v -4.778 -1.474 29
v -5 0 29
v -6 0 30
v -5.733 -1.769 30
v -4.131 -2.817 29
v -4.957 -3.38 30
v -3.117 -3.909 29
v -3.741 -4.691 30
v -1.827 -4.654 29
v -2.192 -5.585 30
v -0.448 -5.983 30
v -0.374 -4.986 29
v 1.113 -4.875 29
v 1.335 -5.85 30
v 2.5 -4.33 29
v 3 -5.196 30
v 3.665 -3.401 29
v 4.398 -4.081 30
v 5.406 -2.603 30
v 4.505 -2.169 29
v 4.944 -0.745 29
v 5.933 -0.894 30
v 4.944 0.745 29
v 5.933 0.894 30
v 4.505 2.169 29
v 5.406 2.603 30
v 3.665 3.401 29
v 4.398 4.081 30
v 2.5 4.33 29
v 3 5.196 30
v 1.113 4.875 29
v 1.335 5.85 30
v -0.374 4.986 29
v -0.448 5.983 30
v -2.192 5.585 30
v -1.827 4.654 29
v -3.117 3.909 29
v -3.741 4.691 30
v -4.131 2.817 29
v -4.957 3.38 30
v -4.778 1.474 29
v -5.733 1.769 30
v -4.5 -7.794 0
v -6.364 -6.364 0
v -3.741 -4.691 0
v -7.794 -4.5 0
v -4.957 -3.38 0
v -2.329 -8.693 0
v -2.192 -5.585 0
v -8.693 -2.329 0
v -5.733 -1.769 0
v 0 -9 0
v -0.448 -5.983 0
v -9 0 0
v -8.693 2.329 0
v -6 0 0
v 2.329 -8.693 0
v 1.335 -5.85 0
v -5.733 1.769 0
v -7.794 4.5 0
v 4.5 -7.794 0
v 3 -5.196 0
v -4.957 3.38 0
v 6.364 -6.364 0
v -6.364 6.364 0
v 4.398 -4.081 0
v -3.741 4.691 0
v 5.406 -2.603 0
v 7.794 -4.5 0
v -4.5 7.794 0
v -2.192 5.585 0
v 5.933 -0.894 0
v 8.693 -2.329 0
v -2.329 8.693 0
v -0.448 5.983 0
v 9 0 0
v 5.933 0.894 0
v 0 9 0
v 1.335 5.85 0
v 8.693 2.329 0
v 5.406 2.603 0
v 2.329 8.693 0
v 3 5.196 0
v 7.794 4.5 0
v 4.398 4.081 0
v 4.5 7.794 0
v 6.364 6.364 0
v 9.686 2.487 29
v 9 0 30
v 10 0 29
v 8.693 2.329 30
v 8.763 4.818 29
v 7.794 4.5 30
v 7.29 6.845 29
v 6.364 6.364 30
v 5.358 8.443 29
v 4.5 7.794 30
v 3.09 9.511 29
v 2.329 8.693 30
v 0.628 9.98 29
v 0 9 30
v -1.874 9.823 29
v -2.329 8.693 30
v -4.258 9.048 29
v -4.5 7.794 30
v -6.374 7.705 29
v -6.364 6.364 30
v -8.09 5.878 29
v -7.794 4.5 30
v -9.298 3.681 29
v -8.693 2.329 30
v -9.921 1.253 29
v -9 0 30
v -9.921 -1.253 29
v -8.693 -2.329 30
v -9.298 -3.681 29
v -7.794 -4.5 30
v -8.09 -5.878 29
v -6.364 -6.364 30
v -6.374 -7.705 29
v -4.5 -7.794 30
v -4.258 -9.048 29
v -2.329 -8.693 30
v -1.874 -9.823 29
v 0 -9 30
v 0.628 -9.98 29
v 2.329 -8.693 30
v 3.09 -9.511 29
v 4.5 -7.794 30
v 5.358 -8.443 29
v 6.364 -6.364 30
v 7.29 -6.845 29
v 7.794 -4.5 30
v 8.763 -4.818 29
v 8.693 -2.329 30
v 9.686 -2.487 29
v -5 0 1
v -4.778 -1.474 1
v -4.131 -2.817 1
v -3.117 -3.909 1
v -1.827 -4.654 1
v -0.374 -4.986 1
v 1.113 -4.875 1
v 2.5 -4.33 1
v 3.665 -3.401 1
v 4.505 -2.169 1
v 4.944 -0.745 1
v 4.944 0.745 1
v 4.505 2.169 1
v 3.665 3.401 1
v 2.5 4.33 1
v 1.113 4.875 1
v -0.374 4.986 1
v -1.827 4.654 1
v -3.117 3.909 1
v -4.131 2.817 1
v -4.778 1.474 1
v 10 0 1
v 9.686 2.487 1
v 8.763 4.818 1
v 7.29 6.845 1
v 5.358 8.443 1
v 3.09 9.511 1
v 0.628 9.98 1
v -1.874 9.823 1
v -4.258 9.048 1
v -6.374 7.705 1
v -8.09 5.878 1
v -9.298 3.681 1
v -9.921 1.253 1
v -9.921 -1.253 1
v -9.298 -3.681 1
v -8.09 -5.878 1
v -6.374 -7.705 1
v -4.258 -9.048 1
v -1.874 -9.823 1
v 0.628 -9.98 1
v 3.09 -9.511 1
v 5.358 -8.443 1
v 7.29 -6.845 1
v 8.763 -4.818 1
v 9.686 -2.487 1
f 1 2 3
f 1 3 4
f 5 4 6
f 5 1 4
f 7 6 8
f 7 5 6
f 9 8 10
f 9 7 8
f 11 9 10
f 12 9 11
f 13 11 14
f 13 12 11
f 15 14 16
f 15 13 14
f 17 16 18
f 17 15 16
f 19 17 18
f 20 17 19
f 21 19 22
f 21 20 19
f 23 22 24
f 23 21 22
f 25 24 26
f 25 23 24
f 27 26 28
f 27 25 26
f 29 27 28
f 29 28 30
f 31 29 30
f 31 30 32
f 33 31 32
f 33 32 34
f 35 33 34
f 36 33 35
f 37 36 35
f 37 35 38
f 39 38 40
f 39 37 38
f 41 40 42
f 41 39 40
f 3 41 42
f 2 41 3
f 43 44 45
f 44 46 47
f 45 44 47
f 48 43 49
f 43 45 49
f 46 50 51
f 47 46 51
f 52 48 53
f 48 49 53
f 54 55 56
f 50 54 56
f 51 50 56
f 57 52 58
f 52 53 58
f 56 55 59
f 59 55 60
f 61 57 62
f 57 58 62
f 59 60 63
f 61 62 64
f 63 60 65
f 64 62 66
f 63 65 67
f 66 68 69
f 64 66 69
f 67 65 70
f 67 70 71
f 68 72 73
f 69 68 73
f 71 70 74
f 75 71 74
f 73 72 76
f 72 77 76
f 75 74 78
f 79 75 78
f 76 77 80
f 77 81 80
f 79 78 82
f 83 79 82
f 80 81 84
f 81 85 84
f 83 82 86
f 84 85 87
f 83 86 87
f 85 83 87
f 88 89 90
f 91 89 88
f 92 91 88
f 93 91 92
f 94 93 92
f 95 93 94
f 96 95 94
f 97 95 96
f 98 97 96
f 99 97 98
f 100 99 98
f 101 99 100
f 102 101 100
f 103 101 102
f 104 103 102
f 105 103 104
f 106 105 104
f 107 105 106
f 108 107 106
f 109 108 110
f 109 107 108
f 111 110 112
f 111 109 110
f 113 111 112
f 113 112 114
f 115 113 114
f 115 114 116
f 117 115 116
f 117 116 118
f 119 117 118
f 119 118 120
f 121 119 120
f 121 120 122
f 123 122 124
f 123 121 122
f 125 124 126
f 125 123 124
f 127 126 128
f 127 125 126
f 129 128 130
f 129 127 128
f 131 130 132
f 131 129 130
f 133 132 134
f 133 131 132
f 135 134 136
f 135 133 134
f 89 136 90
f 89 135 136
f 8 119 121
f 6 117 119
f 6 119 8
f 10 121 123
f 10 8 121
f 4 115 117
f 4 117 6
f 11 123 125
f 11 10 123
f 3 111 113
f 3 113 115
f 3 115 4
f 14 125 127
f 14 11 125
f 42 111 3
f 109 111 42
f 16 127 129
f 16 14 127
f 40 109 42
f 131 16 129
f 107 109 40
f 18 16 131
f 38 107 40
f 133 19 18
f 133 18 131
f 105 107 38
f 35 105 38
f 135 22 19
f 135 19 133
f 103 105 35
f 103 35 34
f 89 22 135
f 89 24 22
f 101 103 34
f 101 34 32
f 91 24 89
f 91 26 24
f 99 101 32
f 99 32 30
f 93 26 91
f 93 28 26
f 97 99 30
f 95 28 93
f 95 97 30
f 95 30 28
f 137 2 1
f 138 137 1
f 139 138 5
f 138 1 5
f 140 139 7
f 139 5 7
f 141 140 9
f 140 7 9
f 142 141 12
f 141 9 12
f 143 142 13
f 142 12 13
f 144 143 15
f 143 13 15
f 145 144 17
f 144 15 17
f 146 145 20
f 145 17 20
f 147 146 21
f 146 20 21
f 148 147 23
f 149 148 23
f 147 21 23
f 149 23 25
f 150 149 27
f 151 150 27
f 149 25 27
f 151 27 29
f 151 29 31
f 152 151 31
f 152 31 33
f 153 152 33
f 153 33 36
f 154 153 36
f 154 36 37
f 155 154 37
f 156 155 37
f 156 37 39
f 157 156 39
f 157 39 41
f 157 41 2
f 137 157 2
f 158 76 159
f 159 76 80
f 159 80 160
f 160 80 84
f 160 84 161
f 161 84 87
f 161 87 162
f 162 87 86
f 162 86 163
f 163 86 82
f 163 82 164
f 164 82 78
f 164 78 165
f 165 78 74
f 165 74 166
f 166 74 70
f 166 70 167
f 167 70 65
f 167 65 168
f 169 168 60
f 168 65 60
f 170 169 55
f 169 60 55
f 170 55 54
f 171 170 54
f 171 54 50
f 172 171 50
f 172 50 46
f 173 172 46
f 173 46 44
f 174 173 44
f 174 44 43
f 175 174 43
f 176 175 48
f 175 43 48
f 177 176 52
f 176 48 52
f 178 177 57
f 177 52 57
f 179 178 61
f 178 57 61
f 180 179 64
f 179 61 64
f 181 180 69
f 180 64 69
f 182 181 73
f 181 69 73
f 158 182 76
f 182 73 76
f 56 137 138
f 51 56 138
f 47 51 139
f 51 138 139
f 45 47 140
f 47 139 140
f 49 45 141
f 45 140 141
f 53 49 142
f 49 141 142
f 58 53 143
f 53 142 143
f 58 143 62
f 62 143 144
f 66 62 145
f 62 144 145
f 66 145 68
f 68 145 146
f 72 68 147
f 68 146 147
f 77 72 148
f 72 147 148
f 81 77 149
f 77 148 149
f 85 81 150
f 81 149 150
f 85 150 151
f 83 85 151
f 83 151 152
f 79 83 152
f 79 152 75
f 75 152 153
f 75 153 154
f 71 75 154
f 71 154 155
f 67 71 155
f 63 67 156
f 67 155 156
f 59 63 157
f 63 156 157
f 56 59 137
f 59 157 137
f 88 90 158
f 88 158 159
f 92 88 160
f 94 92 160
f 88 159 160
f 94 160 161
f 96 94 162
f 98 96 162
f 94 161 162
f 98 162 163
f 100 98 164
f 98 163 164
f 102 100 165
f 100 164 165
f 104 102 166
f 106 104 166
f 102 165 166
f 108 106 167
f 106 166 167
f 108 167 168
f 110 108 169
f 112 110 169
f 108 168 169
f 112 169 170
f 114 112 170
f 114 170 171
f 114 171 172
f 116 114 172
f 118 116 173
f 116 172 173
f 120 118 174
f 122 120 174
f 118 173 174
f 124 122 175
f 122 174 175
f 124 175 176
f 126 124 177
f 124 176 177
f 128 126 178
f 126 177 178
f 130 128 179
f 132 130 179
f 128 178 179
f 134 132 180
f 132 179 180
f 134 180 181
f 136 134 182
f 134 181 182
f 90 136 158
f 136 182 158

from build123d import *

# Parameters (mm, degrees)
F0_R     = 10
F1_DEPTH = 30
F3_D     = 10
F4_SIZE  = 1


with BuildPart() as f1:
    # F0 (on Top) → F1 (new body)
    with BuildSketch(Plane.XY):
        Circle(F0_R)
    extrude(amount=F1_DEPTH)

    # F3 (through all)
    with Locations(Plane(origin=(0, 0, 0), x_dir=(1, 0, 0), z_dir=(0, 0, -1))):
        with Locations((0, 0)):
            Hole(F3_D / 2)

    # F4
    f4_edges = [f1.edges().sort_by_distance(p)[0] for p in [
        (10, 0, 15),
        (-10, 0, 0),
        (-10, 0, 30),
        (-5, 0, 0),
        (-5, 0, 30),
    ]]
    chamfer(f4_edges, length=F4_SIZE)


solid = f1.part
